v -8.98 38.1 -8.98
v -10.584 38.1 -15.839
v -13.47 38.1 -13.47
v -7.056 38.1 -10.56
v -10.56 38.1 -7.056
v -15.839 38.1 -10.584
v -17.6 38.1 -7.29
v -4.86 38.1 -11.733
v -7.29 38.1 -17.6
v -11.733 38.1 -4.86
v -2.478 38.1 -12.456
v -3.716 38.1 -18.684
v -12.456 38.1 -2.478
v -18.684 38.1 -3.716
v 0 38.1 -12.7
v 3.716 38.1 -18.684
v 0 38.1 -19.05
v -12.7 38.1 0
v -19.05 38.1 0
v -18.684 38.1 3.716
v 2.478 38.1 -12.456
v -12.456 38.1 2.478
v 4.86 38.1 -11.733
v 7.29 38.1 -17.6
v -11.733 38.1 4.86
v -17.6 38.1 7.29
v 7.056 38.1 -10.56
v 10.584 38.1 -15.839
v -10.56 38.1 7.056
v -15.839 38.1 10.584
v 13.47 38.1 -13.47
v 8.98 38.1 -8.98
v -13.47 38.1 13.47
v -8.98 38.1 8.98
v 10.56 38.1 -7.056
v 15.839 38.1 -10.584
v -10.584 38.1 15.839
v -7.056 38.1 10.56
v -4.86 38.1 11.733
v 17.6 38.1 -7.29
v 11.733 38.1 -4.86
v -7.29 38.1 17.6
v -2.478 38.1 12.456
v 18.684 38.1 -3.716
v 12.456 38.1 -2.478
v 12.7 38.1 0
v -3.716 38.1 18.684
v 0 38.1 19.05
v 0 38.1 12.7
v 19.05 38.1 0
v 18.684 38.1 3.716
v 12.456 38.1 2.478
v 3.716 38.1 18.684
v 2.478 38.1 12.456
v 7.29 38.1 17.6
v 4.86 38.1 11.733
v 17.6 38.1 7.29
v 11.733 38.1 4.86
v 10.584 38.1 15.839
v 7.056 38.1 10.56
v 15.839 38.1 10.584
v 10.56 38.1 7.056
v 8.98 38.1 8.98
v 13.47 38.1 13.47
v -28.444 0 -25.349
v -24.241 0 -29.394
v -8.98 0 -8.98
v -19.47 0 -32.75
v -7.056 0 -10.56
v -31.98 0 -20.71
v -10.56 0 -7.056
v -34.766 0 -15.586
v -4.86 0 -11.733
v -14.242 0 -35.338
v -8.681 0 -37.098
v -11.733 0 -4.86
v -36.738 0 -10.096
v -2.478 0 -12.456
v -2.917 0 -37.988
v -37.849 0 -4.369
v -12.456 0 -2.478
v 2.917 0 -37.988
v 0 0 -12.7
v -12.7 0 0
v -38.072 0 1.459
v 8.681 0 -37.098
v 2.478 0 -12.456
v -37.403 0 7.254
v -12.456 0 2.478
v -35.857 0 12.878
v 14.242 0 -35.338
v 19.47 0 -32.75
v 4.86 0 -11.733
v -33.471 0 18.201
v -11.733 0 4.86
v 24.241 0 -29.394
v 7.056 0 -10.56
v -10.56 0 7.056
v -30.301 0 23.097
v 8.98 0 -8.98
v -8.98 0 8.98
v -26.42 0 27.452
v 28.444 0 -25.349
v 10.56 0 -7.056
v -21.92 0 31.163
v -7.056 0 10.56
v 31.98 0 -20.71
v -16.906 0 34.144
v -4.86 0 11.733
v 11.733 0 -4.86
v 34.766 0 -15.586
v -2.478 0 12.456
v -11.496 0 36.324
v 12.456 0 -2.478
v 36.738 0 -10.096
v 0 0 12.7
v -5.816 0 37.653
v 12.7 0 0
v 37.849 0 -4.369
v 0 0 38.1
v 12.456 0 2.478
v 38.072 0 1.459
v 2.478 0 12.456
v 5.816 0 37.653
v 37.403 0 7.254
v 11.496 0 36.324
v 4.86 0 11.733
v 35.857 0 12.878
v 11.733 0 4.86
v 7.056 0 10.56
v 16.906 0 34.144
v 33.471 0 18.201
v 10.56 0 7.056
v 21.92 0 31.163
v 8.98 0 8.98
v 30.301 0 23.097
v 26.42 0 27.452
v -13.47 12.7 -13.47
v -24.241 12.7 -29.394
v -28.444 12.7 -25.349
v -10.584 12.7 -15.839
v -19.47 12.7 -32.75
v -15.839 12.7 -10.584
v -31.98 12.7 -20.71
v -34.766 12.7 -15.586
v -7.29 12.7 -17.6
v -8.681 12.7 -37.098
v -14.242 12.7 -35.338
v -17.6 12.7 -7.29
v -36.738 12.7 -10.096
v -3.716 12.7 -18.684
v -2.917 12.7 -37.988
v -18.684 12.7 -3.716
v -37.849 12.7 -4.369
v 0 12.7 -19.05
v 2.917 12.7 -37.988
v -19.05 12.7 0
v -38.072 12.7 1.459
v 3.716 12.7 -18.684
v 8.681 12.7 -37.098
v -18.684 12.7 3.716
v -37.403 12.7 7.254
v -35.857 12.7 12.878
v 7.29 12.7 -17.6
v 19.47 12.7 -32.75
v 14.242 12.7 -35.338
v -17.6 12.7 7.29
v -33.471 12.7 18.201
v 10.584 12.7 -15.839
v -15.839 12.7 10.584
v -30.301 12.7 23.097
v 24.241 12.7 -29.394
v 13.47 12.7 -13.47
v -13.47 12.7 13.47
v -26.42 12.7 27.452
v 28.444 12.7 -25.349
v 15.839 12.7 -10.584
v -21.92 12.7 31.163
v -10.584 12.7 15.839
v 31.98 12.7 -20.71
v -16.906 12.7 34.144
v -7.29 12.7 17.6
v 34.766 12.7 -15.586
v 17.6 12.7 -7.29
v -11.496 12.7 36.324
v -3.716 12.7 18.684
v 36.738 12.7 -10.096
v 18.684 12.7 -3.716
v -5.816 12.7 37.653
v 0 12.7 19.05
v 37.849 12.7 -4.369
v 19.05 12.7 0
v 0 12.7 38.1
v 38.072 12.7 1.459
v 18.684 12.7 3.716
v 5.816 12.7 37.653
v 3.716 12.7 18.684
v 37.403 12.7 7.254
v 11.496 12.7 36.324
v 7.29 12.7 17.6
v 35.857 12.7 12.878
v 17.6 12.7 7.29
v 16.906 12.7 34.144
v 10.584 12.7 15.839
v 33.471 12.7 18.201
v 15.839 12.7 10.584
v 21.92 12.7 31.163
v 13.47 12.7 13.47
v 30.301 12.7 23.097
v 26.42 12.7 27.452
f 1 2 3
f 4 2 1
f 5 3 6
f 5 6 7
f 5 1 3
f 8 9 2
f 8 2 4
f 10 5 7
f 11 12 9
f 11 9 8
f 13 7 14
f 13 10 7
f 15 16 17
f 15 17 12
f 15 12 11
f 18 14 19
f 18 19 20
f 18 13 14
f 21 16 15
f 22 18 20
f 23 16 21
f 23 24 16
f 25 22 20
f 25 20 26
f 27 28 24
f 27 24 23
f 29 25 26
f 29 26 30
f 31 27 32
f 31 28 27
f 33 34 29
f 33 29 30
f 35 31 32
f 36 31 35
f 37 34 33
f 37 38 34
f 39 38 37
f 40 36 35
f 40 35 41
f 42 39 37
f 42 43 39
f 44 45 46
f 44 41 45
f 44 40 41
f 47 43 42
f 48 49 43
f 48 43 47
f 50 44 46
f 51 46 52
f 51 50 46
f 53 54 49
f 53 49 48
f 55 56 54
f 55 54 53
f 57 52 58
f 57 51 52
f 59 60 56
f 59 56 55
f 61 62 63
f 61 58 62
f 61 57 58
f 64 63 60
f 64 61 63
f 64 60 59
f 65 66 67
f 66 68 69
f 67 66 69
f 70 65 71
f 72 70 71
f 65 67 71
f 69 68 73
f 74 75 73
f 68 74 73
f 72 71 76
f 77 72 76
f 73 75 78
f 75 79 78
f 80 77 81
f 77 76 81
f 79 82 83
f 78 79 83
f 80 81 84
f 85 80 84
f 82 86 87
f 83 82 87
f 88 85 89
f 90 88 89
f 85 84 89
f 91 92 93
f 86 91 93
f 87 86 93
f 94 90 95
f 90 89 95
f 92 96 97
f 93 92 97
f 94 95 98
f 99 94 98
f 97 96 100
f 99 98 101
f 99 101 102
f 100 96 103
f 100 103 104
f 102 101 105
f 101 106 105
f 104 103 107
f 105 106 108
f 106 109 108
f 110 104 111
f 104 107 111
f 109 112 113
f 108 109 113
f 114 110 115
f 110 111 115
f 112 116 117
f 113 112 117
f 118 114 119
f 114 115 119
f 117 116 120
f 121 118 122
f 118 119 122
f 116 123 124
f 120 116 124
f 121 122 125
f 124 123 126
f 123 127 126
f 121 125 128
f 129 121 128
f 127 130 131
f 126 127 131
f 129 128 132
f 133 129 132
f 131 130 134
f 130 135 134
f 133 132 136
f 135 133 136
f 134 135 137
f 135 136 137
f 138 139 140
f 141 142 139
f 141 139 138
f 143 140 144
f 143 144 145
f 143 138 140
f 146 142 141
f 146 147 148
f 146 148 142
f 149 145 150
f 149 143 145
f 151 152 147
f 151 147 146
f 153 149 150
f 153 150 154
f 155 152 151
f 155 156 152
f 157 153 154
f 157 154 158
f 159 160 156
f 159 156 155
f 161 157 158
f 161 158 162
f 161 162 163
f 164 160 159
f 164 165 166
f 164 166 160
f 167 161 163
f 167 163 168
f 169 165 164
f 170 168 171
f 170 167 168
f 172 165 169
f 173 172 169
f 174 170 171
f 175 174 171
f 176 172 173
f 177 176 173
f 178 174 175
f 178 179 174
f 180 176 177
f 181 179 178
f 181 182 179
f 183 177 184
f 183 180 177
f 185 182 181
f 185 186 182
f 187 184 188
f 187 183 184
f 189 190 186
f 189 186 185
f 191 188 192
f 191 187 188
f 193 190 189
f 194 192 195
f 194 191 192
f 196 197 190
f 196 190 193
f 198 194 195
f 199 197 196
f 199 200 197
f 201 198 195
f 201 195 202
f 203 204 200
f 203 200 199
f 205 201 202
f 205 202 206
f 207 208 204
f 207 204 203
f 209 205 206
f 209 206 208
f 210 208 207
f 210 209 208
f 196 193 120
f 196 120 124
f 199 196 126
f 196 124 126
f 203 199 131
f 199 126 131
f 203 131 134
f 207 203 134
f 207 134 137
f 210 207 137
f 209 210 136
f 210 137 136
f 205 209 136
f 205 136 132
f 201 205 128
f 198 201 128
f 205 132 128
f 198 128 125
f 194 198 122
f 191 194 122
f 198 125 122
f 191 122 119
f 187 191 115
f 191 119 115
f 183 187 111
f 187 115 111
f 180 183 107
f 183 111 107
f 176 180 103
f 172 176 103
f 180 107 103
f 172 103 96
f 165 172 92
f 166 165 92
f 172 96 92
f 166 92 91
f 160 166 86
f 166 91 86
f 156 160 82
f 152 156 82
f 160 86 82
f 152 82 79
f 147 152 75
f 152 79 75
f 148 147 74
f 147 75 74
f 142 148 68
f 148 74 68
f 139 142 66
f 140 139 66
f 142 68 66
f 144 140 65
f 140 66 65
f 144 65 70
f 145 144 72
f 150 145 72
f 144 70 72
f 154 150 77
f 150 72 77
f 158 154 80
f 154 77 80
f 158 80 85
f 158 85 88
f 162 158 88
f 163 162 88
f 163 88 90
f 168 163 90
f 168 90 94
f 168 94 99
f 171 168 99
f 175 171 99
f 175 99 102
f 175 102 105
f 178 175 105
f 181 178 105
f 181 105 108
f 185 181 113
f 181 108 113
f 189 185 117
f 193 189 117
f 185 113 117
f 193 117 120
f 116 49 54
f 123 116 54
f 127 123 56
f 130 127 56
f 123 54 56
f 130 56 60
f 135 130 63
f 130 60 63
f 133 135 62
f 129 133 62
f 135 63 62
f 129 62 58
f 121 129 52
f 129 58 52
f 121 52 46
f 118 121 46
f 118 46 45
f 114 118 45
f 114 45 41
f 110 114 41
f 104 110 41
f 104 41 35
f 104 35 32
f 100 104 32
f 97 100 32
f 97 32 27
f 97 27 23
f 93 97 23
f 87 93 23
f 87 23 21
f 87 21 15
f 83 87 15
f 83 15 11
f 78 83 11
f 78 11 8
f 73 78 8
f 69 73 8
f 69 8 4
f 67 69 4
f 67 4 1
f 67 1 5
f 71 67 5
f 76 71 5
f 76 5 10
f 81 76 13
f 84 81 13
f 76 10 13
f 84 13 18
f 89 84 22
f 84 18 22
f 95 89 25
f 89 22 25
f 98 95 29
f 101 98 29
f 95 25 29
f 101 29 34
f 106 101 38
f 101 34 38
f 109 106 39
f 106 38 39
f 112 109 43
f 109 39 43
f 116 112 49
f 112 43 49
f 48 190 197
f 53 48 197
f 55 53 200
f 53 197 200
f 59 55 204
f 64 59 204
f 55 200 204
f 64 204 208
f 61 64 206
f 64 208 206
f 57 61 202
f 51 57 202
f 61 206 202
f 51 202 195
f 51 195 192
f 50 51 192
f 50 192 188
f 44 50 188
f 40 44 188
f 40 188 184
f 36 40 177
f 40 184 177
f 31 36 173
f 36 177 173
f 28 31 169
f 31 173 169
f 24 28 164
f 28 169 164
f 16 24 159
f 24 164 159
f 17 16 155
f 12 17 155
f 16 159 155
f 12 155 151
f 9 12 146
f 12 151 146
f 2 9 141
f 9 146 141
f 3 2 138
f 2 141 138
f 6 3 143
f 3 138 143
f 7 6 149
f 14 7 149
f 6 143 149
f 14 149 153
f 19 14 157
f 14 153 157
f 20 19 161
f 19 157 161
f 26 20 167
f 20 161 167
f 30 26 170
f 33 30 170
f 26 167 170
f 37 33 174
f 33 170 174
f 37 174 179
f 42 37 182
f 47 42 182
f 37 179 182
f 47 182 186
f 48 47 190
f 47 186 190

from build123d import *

# Parameters (mm, degrees)
SKETCH1_R          = 38.1
EXTRUDE1_DEPTH     = 12.7
SKETCH2_R          = 19.05
EXTRUDE2_DEPTH     = 25.4
SKETCH3_R          = 12.7
CUT_EXTRUDE1_DEPTH = 66.991135768


with BuildPart() as part:
    # Sketch1 → Extrude1 (new body)
    with BuildSketch(Plane(origin=(0, 0, 0), x_dir=(1, 0, 0), z_dir=(0, 1, 0))):
        with Locations(Location((0, 0, 0), (0, 0, 270))):
            Circle(SKETCH1_R)
    extrude(amount=EXTRUDE1_DEPTH)

    # Sketch2 → Extrude2 (add)
    with BuildSketch(Plane(origin=(0, 12.7, 0), x_dir=(-1, 0, 0), z_dir=(0, 1, 0))):
        with Locations(Location((0, 0, 0), (0, 0, 90))):
            Circle(SKETCH2_R)
    extrude(amount=EXTRUDE2_DEPTH)

    # Sketch3 → Cut-Extrude1 (cut, through all)
    with BuildSketch(Plane(origin=(0, 38.1, 0), x_dir=(-1, 0, 0), z_dir=(0, 1, 0))):
        with Locations(Location((0, 0, 0), (0, 0, 90))):
            Circle(SKETCH3_R)
    extrude(amount=-CUT_EXTRUDE1_DEPTH, mode=Mode.SUBTRACT)


solid = part.part
